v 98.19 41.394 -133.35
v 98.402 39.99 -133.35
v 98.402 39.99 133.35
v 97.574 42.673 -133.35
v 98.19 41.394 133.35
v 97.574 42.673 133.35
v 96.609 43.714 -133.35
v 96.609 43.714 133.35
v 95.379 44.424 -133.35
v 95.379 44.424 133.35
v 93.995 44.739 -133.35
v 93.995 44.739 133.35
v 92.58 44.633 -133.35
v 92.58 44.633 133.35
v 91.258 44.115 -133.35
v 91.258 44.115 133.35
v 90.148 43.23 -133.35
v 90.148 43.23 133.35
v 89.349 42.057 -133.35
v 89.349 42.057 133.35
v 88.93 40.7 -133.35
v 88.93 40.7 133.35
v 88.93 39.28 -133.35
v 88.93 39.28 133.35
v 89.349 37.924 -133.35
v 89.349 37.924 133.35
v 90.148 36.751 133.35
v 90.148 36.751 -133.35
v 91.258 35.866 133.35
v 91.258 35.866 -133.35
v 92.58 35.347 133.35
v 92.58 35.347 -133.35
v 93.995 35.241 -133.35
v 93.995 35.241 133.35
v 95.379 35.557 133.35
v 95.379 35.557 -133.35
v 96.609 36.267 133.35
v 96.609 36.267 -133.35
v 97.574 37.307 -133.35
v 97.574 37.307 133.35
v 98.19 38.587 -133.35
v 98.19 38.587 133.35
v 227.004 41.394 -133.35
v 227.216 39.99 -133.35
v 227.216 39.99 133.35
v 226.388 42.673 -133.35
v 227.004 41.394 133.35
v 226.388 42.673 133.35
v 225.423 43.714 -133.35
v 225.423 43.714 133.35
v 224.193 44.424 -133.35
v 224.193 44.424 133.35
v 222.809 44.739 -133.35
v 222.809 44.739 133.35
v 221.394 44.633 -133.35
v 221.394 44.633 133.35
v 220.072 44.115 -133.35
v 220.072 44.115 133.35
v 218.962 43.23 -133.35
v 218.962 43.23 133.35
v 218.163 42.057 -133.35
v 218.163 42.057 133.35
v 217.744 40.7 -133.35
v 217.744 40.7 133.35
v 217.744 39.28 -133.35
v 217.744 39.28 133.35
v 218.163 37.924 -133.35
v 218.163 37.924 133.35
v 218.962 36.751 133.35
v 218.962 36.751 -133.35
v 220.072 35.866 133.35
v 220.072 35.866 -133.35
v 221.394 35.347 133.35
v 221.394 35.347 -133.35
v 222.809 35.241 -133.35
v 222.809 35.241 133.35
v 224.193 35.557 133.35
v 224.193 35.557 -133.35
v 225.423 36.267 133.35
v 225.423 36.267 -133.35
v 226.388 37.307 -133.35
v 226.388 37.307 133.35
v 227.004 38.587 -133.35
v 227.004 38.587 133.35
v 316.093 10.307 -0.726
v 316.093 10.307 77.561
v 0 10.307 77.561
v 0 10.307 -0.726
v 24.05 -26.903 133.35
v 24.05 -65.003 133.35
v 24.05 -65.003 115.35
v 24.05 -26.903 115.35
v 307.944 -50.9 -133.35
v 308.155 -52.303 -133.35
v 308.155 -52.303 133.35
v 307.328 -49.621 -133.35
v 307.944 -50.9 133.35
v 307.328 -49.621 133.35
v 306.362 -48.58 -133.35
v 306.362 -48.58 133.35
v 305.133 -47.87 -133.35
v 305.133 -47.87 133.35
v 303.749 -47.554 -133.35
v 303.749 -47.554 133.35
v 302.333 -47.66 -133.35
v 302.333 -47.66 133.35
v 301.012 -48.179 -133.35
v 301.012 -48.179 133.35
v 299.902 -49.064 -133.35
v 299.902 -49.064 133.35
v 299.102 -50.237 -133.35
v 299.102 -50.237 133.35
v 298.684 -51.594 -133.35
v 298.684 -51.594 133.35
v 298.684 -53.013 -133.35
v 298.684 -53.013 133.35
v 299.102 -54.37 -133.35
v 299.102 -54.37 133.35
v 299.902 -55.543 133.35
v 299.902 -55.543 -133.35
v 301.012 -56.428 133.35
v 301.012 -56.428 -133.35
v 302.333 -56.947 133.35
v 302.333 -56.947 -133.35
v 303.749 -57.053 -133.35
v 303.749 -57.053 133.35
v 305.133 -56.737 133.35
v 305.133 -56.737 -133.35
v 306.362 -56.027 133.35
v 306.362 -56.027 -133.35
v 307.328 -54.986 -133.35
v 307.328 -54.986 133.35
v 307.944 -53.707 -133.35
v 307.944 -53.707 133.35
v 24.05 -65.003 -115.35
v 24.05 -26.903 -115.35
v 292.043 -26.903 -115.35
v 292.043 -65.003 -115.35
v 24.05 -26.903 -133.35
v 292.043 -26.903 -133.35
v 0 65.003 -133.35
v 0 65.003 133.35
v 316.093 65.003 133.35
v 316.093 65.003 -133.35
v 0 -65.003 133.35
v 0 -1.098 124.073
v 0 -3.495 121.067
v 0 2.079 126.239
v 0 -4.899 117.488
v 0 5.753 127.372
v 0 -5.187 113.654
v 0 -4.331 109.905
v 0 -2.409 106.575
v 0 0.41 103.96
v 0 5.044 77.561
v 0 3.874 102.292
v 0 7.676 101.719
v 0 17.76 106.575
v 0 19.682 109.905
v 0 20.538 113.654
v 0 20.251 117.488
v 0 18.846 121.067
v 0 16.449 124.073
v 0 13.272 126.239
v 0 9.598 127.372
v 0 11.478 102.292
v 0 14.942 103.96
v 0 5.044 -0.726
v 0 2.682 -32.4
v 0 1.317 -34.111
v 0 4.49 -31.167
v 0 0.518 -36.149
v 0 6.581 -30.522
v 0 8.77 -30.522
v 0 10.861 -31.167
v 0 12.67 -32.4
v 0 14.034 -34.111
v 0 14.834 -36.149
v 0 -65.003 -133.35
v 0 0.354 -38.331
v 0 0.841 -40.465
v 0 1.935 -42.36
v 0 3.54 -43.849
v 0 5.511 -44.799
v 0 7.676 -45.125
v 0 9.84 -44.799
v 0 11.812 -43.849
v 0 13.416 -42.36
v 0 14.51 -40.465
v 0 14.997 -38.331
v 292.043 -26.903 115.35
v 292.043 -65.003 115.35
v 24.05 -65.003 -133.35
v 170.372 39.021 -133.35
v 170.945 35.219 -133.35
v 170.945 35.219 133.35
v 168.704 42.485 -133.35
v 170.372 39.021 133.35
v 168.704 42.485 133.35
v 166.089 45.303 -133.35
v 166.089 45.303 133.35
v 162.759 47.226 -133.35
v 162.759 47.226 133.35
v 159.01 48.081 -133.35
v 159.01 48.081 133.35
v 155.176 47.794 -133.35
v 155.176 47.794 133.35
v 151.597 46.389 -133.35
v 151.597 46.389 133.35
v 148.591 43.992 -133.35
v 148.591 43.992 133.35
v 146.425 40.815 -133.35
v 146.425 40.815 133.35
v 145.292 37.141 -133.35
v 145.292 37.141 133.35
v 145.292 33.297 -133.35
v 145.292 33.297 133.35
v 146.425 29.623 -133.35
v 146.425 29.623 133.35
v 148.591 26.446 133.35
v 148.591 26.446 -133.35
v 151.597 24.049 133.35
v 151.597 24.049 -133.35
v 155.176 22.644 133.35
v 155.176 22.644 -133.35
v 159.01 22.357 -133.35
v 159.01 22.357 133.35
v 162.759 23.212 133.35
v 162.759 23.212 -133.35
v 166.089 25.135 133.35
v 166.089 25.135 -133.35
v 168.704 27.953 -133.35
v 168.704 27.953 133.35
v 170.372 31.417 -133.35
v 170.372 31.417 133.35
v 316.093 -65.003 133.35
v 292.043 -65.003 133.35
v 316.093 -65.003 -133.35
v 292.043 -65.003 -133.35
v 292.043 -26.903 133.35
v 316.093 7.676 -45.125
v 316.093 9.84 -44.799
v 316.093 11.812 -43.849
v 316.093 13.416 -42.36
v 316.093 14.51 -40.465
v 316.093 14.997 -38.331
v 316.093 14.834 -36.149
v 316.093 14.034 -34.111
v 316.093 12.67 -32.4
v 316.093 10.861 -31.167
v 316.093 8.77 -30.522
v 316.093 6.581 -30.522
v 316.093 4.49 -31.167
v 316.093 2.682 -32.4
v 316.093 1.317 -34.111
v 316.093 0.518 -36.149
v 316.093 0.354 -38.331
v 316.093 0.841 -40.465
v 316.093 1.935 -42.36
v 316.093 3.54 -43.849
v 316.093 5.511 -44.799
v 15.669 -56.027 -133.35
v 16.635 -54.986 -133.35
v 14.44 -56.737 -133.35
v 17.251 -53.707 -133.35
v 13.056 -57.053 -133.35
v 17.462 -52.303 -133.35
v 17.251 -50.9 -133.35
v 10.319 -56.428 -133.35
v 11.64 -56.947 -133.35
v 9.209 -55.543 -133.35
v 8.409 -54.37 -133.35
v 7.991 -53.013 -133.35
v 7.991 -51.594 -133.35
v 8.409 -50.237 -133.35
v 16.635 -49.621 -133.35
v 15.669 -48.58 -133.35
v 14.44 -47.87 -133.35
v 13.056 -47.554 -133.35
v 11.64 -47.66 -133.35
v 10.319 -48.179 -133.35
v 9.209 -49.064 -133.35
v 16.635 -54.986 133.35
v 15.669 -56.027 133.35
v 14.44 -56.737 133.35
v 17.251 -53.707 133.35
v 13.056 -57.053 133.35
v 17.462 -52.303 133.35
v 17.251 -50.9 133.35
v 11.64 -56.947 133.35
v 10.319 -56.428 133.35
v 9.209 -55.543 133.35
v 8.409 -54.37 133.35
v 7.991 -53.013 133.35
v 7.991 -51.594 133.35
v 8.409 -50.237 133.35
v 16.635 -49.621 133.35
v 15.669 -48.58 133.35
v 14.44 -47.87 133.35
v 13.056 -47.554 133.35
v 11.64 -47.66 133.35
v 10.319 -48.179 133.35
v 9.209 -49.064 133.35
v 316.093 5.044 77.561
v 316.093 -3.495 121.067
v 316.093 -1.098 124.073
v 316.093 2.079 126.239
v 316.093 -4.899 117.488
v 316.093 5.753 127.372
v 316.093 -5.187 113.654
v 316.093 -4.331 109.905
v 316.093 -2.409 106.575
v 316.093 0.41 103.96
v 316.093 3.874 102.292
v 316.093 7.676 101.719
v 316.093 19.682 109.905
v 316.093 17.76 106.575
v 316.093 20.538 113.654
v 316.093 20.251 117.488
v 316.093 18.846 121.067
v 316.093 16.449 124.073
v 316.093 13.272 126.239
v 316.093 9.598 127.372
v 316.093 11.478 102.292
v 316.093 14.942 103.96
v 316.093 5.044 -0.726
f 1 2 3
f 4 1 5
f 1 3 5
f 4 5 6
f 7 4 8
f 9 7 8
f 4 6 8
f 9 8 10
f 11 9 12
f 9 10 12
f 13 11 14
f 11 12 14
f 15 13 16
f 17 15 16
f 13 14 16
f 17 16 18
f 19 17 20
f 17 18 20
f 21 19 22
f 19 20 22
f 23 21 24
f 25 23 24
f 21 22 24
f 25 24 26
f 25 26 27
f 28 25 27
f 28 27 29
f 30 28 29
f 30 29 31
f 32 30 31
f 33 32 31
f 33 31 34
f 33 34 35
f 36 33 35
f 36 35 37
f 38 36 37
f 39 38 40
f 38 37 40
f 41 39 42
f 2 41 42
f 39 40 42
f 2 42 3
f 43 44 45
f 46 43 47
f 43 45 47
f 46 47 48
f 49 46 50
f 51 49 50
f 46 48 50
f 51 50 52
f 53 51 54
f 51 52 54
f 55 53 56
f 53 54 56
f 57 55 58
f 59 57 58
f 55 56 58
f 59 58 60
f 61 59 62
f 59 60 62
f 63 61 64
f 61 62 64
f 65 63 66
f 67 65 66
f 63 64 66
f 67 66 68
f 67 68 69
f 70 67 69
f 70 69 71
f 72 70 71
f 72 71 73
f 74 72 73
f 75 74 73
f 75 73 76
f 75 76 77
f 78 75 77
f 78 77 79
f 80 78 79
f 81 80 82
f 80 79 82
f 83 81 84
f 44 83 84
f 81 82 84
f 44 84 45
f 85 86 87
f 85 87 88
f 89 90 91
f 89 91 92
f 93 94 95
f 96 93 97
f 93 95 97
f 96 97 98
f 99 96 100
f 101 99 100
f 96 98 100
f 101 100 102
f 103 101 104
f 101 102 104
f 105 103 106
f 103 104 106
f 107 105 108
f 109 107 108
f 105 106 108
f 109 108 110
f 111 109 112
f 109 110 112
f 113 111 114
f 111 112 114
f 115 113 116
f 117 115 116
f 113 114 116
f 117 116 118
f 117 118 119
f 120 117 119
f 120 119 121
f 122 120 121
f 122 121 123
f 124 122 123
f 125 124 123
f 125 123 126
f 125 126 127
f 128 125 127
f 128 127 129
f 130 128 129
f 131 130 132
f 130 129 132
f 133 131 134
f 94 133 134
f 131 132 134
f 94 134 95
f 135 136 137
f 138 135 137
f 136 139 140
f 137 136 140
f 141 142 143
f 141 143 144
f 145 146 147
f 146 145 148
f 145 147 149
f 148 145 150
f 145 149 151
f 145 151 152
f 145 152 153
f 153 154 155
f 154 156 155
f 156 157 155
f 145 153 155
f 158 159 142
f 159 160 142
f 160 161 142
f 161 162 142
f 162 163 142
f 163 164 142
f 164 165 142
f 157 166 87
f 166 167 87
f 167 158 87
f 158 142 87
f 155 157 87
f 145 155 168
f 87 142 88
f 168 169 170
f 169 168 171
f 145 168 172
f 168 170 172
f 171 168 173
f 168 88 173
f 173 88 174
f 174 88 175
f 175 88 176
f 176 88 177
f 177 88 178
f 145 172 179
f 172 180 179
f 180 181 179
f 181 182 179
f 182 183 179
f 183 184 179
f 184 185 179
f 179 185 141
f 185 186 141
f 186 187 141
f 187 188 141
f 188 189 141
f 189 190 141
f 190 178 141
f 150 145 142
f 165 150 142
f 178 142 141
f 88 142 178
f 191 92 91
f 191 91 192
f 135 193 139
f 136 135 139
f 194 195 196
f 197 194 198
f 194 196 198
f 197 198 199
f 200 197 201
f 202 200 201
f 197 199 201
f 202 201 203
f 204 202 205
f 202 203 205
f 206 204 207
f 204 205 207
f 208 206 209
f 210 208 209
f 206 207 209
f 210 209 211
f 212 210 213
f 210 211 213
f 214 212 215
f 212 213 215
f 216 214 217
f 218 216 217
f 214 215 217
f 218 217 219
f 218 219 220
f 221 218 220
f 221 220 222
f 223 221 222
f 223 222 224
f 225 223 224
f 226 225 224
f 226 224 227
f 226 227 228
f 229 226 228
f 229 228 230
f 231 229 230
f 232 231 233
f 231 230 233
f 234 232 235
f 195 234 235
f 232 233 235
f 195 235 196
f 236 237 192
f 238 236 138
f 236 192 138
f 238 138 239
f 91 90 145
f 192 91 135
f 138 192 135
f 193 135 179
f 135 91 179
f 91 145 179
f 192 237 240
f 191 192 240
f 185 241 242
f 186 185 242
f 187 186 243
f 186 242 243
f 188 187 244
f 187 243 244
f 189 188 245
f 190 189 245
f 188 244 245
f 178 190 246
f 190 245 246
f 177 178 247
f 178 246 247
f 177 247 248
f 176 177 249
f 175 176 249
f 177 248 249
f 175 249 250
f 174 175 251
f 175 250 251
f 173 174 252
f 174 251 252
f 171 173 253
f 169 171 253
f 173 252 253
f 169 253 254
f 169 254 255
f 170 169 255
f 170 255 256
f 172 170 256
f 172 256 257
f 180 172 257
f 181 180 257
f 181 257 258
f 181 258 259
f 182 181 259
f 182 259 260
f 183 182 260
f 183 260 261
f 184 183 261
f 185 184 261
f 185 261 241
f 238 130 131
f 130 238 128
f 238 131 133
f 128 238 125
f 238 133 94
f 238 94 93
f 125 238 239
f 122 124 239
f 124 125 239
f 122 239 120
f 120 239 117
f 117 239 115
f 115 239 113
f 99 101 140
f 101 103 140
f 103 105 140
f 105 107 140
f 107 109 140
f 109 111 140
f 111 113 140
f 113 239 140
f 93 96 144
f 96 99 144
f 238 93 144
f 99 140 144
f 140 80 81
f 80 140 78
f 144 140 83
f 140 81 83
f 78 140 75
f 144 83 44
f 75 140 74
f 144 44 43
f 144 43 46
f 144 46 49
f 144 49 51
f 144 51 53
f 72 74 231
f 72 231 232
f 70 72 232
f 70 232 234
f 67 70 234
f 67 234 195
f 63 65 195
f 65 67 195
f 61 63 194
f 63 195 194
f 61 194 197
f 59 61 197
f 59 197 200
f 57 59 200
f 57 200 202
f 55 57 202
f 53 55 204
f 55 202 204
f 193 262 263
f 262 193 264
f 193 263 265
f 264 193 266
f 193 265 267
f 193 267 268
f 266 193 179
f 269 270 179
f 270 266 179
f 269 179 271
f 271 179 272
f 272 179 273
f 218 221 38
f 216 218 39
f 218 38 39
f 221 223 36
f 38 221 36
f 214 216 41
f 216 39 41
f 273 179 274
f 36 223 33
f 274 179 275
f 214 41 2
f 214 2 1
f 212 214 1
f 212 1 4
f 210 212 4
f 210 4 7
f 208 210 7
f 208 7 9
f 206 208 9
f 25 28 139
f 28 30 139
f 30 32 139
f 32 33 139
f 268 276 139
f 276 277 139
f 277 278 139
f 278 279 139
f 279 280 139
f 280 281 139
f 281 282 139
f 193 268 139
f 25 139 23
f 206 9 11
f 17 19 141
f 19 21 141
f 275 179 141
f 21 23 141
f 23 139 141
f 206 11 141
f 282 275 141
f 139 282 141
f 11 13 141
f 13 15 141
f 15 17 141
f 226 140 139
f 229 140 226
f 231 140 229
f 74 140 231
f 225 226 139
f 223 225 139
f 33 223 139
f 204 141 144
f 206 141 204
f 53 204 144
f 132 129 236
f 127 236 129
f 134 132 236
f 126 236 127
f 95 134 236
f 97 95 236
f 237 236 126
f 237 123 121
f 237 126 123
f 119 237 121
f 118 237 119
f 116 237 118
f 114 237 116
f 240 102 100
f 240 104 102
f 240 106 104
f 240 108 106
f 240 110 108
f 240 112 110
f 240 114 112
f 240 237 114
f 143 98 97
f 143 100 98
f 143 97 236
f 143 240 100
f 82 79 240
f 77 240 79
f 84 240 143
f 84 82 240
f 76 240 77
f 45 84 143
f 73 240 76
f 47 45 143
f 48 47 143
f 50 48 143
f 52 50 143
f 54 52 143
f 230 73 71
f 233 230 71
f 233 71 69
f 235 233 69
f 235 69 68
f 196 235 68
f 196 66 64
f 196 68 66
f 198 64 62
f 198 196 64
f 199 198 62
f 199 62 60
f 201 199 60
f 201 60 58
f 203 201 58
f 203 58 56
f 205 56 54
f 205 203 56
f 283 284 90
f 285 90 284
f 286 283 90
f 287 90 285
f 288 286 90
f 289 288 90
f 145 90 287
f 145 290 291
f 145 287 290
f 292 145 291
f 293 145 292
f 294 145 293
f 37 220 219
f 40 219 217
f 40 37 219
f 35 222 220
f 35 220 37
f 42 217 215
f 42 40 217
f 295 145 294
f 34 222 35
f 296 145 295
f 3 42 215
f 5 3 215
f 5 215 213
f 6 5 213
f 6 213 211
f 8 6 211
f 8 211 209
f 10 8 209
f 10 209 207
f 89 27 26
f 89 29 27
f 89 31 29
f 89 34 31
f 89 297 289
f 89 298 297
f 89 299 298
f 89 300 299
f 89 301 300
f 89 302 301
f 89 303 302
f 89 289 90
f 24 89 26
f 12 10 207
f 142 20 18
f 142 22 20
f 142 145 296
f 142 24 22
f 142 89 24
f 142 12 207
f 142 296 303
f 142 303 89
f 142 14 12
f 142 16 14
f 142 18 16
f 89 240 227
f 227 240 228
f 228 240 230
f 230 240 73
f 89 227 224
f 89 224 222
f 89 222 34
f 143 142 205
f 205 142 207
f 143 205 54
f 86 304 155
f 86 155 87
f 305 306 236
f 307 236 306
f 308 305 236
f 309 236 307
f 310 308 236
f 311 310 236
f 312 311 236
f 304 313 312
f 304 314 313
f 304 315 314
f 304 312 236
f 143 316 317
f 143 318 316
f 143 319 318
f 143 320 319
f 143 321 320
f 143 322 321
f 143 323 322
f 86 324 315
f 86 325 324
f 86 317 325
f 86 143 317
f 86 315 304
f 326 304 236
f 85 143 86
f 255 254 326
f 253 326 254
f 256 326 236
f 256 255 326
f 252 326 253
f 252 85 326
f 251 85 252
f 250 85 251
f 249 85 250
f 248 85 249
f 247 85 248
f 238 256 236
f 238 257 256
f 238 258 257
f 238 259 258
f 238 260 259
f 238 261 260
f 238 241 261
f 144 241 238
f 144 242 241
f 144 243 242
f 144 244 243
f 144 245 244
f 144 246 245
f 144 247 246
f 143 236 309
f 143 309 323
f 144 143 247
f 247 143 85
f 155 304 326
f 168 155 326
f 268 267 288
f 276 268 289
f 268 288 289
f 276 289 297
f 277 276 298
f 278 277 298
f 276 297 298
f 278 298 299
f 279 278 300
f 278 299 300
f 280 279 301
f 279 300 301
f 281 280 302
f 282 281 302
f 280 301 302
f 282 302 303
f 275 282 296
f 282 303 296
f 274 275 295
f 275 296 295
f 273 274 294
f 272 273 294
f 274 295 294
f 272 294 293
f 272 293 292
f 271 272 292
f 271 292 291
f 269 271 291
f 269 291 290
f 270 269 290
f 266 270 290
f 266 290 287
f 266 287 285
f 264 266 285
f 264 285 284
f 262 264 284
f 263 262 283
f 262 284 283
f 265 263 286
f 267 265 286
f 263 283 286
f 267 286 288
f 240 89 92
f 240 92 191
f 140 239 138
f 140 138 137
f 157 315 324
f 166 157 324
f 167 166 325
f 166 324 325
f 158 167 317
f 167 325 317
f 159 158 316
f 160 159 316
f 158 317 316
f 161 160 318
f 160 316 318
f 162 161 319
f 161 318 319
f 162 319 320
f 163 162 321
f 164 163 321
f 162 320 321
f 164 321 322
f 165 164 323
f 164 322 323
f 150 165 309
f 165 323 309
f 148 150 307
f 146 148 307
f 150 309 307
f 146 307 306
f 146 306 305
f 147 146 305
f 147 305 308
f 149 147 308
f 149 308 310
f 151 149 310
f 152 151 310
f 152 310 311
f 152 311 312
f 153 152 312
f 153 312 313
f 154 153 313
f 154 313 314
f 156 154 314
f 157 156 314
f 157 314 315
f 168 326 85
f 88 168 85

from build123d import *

# Parameters (mm, degrees)
SKETCH1_W           = 266.7
SKETCH1_H           = 130.0068901
BOSS_EXTRUDE1_DEPTH = 316.09292636
SKETCH2_R           = 4.7625
SKETCH2_R_2         = 12.8984375
CUT_EXTRUDE1_DEPTH  = 266.7
SKETCH3_R           = 12.8984375
SKETCH3_R_2         = 7.3421875
SKETCH3_W           = 78.287500016
SKETCH3_H           = 5.262500016
CUT_EXTRUDE2_DEPTH  = 332.74
SKETCH4_W           = 267.993719028
SKETCH4_H           = 38.1
CUT_EXTRUDE3_DEPTH  = 18.000000068


with BuildPart() as part:
    # Sketch1 → Boss-Extrude1 (new body)
    with BuildSketch(Plane(origin=(0, 0, 0), x_dir=(0, 0, -1), z_dir=(1, 0, 0))):
        Rectangle(SKETCH1_W, SKETCH1_H)
    extrude(amount=BOSS_EXTRUDE1_DEPTH)

    # Sketch2 → Cut-Extrude1 (cut)
    with BuildSketch(Plane.XY.offset(133.35)):
        with Locations((93.639440102, 39.990297972)):
            Circle(SKETCH2_R)
        with Locations((222.453486258, 39.990297972)):
            Circle(SKETCH2_R)
        with Locations((303.39292636, -52.30344505)):
            Circle(SKETCH2_R)
        with Locations((12.7, -52.30344505)):
            Circle(SKETCH2_R)
        with Locations((158.04646318, 35.218991284)):
            Circle(SKETCH2_R_2)
    extrude(amount=-CUT_EXTRUDE1_DEPTH, mode=Mode.SUBTRACT)

    # Sketch3 → Cut-Extrude2 (cut)
    with BuildSketch(Plane(origin=(316.09292636, 0, 0), x_dir=(0, 0, -1), z_dir=(1, 0, 0))):
        with Locations((-114.617463678, 7.67564505)):
            Circle(SKETCH3_R)
        with Locations((37.782536322, 7.67564505)):
            Circle(SKETCH3_R_2)
        with Locations((-38.4175, 7.67564505)):
            Rectangle(SKETCH3_W, SKETCH3_H)
    extrude(amount=-CUT_EXTRUDE2_DEPTH, mode=Mode.SUBTRACT)

    # Sketch4 → Cut-Extrude3 (cut)
    with BuildSketch(Plane.XY.offset(133.35)):
        with Locations((158.04646318, -45.95344505)):
            Rectangle(SKETCH4_W, SKETCH4_H)
    cut_extrude3 = extrude(amount=-CUT_EXTRUDE3_DEPTH, mode=Mode.SUBTRACT)

    # Mirror1: Cut-Extrude3 across plane
    add(cut_extrude3.mirror(Plane.XY), mode=Mode.SUBTRACT)


solid = part.part
